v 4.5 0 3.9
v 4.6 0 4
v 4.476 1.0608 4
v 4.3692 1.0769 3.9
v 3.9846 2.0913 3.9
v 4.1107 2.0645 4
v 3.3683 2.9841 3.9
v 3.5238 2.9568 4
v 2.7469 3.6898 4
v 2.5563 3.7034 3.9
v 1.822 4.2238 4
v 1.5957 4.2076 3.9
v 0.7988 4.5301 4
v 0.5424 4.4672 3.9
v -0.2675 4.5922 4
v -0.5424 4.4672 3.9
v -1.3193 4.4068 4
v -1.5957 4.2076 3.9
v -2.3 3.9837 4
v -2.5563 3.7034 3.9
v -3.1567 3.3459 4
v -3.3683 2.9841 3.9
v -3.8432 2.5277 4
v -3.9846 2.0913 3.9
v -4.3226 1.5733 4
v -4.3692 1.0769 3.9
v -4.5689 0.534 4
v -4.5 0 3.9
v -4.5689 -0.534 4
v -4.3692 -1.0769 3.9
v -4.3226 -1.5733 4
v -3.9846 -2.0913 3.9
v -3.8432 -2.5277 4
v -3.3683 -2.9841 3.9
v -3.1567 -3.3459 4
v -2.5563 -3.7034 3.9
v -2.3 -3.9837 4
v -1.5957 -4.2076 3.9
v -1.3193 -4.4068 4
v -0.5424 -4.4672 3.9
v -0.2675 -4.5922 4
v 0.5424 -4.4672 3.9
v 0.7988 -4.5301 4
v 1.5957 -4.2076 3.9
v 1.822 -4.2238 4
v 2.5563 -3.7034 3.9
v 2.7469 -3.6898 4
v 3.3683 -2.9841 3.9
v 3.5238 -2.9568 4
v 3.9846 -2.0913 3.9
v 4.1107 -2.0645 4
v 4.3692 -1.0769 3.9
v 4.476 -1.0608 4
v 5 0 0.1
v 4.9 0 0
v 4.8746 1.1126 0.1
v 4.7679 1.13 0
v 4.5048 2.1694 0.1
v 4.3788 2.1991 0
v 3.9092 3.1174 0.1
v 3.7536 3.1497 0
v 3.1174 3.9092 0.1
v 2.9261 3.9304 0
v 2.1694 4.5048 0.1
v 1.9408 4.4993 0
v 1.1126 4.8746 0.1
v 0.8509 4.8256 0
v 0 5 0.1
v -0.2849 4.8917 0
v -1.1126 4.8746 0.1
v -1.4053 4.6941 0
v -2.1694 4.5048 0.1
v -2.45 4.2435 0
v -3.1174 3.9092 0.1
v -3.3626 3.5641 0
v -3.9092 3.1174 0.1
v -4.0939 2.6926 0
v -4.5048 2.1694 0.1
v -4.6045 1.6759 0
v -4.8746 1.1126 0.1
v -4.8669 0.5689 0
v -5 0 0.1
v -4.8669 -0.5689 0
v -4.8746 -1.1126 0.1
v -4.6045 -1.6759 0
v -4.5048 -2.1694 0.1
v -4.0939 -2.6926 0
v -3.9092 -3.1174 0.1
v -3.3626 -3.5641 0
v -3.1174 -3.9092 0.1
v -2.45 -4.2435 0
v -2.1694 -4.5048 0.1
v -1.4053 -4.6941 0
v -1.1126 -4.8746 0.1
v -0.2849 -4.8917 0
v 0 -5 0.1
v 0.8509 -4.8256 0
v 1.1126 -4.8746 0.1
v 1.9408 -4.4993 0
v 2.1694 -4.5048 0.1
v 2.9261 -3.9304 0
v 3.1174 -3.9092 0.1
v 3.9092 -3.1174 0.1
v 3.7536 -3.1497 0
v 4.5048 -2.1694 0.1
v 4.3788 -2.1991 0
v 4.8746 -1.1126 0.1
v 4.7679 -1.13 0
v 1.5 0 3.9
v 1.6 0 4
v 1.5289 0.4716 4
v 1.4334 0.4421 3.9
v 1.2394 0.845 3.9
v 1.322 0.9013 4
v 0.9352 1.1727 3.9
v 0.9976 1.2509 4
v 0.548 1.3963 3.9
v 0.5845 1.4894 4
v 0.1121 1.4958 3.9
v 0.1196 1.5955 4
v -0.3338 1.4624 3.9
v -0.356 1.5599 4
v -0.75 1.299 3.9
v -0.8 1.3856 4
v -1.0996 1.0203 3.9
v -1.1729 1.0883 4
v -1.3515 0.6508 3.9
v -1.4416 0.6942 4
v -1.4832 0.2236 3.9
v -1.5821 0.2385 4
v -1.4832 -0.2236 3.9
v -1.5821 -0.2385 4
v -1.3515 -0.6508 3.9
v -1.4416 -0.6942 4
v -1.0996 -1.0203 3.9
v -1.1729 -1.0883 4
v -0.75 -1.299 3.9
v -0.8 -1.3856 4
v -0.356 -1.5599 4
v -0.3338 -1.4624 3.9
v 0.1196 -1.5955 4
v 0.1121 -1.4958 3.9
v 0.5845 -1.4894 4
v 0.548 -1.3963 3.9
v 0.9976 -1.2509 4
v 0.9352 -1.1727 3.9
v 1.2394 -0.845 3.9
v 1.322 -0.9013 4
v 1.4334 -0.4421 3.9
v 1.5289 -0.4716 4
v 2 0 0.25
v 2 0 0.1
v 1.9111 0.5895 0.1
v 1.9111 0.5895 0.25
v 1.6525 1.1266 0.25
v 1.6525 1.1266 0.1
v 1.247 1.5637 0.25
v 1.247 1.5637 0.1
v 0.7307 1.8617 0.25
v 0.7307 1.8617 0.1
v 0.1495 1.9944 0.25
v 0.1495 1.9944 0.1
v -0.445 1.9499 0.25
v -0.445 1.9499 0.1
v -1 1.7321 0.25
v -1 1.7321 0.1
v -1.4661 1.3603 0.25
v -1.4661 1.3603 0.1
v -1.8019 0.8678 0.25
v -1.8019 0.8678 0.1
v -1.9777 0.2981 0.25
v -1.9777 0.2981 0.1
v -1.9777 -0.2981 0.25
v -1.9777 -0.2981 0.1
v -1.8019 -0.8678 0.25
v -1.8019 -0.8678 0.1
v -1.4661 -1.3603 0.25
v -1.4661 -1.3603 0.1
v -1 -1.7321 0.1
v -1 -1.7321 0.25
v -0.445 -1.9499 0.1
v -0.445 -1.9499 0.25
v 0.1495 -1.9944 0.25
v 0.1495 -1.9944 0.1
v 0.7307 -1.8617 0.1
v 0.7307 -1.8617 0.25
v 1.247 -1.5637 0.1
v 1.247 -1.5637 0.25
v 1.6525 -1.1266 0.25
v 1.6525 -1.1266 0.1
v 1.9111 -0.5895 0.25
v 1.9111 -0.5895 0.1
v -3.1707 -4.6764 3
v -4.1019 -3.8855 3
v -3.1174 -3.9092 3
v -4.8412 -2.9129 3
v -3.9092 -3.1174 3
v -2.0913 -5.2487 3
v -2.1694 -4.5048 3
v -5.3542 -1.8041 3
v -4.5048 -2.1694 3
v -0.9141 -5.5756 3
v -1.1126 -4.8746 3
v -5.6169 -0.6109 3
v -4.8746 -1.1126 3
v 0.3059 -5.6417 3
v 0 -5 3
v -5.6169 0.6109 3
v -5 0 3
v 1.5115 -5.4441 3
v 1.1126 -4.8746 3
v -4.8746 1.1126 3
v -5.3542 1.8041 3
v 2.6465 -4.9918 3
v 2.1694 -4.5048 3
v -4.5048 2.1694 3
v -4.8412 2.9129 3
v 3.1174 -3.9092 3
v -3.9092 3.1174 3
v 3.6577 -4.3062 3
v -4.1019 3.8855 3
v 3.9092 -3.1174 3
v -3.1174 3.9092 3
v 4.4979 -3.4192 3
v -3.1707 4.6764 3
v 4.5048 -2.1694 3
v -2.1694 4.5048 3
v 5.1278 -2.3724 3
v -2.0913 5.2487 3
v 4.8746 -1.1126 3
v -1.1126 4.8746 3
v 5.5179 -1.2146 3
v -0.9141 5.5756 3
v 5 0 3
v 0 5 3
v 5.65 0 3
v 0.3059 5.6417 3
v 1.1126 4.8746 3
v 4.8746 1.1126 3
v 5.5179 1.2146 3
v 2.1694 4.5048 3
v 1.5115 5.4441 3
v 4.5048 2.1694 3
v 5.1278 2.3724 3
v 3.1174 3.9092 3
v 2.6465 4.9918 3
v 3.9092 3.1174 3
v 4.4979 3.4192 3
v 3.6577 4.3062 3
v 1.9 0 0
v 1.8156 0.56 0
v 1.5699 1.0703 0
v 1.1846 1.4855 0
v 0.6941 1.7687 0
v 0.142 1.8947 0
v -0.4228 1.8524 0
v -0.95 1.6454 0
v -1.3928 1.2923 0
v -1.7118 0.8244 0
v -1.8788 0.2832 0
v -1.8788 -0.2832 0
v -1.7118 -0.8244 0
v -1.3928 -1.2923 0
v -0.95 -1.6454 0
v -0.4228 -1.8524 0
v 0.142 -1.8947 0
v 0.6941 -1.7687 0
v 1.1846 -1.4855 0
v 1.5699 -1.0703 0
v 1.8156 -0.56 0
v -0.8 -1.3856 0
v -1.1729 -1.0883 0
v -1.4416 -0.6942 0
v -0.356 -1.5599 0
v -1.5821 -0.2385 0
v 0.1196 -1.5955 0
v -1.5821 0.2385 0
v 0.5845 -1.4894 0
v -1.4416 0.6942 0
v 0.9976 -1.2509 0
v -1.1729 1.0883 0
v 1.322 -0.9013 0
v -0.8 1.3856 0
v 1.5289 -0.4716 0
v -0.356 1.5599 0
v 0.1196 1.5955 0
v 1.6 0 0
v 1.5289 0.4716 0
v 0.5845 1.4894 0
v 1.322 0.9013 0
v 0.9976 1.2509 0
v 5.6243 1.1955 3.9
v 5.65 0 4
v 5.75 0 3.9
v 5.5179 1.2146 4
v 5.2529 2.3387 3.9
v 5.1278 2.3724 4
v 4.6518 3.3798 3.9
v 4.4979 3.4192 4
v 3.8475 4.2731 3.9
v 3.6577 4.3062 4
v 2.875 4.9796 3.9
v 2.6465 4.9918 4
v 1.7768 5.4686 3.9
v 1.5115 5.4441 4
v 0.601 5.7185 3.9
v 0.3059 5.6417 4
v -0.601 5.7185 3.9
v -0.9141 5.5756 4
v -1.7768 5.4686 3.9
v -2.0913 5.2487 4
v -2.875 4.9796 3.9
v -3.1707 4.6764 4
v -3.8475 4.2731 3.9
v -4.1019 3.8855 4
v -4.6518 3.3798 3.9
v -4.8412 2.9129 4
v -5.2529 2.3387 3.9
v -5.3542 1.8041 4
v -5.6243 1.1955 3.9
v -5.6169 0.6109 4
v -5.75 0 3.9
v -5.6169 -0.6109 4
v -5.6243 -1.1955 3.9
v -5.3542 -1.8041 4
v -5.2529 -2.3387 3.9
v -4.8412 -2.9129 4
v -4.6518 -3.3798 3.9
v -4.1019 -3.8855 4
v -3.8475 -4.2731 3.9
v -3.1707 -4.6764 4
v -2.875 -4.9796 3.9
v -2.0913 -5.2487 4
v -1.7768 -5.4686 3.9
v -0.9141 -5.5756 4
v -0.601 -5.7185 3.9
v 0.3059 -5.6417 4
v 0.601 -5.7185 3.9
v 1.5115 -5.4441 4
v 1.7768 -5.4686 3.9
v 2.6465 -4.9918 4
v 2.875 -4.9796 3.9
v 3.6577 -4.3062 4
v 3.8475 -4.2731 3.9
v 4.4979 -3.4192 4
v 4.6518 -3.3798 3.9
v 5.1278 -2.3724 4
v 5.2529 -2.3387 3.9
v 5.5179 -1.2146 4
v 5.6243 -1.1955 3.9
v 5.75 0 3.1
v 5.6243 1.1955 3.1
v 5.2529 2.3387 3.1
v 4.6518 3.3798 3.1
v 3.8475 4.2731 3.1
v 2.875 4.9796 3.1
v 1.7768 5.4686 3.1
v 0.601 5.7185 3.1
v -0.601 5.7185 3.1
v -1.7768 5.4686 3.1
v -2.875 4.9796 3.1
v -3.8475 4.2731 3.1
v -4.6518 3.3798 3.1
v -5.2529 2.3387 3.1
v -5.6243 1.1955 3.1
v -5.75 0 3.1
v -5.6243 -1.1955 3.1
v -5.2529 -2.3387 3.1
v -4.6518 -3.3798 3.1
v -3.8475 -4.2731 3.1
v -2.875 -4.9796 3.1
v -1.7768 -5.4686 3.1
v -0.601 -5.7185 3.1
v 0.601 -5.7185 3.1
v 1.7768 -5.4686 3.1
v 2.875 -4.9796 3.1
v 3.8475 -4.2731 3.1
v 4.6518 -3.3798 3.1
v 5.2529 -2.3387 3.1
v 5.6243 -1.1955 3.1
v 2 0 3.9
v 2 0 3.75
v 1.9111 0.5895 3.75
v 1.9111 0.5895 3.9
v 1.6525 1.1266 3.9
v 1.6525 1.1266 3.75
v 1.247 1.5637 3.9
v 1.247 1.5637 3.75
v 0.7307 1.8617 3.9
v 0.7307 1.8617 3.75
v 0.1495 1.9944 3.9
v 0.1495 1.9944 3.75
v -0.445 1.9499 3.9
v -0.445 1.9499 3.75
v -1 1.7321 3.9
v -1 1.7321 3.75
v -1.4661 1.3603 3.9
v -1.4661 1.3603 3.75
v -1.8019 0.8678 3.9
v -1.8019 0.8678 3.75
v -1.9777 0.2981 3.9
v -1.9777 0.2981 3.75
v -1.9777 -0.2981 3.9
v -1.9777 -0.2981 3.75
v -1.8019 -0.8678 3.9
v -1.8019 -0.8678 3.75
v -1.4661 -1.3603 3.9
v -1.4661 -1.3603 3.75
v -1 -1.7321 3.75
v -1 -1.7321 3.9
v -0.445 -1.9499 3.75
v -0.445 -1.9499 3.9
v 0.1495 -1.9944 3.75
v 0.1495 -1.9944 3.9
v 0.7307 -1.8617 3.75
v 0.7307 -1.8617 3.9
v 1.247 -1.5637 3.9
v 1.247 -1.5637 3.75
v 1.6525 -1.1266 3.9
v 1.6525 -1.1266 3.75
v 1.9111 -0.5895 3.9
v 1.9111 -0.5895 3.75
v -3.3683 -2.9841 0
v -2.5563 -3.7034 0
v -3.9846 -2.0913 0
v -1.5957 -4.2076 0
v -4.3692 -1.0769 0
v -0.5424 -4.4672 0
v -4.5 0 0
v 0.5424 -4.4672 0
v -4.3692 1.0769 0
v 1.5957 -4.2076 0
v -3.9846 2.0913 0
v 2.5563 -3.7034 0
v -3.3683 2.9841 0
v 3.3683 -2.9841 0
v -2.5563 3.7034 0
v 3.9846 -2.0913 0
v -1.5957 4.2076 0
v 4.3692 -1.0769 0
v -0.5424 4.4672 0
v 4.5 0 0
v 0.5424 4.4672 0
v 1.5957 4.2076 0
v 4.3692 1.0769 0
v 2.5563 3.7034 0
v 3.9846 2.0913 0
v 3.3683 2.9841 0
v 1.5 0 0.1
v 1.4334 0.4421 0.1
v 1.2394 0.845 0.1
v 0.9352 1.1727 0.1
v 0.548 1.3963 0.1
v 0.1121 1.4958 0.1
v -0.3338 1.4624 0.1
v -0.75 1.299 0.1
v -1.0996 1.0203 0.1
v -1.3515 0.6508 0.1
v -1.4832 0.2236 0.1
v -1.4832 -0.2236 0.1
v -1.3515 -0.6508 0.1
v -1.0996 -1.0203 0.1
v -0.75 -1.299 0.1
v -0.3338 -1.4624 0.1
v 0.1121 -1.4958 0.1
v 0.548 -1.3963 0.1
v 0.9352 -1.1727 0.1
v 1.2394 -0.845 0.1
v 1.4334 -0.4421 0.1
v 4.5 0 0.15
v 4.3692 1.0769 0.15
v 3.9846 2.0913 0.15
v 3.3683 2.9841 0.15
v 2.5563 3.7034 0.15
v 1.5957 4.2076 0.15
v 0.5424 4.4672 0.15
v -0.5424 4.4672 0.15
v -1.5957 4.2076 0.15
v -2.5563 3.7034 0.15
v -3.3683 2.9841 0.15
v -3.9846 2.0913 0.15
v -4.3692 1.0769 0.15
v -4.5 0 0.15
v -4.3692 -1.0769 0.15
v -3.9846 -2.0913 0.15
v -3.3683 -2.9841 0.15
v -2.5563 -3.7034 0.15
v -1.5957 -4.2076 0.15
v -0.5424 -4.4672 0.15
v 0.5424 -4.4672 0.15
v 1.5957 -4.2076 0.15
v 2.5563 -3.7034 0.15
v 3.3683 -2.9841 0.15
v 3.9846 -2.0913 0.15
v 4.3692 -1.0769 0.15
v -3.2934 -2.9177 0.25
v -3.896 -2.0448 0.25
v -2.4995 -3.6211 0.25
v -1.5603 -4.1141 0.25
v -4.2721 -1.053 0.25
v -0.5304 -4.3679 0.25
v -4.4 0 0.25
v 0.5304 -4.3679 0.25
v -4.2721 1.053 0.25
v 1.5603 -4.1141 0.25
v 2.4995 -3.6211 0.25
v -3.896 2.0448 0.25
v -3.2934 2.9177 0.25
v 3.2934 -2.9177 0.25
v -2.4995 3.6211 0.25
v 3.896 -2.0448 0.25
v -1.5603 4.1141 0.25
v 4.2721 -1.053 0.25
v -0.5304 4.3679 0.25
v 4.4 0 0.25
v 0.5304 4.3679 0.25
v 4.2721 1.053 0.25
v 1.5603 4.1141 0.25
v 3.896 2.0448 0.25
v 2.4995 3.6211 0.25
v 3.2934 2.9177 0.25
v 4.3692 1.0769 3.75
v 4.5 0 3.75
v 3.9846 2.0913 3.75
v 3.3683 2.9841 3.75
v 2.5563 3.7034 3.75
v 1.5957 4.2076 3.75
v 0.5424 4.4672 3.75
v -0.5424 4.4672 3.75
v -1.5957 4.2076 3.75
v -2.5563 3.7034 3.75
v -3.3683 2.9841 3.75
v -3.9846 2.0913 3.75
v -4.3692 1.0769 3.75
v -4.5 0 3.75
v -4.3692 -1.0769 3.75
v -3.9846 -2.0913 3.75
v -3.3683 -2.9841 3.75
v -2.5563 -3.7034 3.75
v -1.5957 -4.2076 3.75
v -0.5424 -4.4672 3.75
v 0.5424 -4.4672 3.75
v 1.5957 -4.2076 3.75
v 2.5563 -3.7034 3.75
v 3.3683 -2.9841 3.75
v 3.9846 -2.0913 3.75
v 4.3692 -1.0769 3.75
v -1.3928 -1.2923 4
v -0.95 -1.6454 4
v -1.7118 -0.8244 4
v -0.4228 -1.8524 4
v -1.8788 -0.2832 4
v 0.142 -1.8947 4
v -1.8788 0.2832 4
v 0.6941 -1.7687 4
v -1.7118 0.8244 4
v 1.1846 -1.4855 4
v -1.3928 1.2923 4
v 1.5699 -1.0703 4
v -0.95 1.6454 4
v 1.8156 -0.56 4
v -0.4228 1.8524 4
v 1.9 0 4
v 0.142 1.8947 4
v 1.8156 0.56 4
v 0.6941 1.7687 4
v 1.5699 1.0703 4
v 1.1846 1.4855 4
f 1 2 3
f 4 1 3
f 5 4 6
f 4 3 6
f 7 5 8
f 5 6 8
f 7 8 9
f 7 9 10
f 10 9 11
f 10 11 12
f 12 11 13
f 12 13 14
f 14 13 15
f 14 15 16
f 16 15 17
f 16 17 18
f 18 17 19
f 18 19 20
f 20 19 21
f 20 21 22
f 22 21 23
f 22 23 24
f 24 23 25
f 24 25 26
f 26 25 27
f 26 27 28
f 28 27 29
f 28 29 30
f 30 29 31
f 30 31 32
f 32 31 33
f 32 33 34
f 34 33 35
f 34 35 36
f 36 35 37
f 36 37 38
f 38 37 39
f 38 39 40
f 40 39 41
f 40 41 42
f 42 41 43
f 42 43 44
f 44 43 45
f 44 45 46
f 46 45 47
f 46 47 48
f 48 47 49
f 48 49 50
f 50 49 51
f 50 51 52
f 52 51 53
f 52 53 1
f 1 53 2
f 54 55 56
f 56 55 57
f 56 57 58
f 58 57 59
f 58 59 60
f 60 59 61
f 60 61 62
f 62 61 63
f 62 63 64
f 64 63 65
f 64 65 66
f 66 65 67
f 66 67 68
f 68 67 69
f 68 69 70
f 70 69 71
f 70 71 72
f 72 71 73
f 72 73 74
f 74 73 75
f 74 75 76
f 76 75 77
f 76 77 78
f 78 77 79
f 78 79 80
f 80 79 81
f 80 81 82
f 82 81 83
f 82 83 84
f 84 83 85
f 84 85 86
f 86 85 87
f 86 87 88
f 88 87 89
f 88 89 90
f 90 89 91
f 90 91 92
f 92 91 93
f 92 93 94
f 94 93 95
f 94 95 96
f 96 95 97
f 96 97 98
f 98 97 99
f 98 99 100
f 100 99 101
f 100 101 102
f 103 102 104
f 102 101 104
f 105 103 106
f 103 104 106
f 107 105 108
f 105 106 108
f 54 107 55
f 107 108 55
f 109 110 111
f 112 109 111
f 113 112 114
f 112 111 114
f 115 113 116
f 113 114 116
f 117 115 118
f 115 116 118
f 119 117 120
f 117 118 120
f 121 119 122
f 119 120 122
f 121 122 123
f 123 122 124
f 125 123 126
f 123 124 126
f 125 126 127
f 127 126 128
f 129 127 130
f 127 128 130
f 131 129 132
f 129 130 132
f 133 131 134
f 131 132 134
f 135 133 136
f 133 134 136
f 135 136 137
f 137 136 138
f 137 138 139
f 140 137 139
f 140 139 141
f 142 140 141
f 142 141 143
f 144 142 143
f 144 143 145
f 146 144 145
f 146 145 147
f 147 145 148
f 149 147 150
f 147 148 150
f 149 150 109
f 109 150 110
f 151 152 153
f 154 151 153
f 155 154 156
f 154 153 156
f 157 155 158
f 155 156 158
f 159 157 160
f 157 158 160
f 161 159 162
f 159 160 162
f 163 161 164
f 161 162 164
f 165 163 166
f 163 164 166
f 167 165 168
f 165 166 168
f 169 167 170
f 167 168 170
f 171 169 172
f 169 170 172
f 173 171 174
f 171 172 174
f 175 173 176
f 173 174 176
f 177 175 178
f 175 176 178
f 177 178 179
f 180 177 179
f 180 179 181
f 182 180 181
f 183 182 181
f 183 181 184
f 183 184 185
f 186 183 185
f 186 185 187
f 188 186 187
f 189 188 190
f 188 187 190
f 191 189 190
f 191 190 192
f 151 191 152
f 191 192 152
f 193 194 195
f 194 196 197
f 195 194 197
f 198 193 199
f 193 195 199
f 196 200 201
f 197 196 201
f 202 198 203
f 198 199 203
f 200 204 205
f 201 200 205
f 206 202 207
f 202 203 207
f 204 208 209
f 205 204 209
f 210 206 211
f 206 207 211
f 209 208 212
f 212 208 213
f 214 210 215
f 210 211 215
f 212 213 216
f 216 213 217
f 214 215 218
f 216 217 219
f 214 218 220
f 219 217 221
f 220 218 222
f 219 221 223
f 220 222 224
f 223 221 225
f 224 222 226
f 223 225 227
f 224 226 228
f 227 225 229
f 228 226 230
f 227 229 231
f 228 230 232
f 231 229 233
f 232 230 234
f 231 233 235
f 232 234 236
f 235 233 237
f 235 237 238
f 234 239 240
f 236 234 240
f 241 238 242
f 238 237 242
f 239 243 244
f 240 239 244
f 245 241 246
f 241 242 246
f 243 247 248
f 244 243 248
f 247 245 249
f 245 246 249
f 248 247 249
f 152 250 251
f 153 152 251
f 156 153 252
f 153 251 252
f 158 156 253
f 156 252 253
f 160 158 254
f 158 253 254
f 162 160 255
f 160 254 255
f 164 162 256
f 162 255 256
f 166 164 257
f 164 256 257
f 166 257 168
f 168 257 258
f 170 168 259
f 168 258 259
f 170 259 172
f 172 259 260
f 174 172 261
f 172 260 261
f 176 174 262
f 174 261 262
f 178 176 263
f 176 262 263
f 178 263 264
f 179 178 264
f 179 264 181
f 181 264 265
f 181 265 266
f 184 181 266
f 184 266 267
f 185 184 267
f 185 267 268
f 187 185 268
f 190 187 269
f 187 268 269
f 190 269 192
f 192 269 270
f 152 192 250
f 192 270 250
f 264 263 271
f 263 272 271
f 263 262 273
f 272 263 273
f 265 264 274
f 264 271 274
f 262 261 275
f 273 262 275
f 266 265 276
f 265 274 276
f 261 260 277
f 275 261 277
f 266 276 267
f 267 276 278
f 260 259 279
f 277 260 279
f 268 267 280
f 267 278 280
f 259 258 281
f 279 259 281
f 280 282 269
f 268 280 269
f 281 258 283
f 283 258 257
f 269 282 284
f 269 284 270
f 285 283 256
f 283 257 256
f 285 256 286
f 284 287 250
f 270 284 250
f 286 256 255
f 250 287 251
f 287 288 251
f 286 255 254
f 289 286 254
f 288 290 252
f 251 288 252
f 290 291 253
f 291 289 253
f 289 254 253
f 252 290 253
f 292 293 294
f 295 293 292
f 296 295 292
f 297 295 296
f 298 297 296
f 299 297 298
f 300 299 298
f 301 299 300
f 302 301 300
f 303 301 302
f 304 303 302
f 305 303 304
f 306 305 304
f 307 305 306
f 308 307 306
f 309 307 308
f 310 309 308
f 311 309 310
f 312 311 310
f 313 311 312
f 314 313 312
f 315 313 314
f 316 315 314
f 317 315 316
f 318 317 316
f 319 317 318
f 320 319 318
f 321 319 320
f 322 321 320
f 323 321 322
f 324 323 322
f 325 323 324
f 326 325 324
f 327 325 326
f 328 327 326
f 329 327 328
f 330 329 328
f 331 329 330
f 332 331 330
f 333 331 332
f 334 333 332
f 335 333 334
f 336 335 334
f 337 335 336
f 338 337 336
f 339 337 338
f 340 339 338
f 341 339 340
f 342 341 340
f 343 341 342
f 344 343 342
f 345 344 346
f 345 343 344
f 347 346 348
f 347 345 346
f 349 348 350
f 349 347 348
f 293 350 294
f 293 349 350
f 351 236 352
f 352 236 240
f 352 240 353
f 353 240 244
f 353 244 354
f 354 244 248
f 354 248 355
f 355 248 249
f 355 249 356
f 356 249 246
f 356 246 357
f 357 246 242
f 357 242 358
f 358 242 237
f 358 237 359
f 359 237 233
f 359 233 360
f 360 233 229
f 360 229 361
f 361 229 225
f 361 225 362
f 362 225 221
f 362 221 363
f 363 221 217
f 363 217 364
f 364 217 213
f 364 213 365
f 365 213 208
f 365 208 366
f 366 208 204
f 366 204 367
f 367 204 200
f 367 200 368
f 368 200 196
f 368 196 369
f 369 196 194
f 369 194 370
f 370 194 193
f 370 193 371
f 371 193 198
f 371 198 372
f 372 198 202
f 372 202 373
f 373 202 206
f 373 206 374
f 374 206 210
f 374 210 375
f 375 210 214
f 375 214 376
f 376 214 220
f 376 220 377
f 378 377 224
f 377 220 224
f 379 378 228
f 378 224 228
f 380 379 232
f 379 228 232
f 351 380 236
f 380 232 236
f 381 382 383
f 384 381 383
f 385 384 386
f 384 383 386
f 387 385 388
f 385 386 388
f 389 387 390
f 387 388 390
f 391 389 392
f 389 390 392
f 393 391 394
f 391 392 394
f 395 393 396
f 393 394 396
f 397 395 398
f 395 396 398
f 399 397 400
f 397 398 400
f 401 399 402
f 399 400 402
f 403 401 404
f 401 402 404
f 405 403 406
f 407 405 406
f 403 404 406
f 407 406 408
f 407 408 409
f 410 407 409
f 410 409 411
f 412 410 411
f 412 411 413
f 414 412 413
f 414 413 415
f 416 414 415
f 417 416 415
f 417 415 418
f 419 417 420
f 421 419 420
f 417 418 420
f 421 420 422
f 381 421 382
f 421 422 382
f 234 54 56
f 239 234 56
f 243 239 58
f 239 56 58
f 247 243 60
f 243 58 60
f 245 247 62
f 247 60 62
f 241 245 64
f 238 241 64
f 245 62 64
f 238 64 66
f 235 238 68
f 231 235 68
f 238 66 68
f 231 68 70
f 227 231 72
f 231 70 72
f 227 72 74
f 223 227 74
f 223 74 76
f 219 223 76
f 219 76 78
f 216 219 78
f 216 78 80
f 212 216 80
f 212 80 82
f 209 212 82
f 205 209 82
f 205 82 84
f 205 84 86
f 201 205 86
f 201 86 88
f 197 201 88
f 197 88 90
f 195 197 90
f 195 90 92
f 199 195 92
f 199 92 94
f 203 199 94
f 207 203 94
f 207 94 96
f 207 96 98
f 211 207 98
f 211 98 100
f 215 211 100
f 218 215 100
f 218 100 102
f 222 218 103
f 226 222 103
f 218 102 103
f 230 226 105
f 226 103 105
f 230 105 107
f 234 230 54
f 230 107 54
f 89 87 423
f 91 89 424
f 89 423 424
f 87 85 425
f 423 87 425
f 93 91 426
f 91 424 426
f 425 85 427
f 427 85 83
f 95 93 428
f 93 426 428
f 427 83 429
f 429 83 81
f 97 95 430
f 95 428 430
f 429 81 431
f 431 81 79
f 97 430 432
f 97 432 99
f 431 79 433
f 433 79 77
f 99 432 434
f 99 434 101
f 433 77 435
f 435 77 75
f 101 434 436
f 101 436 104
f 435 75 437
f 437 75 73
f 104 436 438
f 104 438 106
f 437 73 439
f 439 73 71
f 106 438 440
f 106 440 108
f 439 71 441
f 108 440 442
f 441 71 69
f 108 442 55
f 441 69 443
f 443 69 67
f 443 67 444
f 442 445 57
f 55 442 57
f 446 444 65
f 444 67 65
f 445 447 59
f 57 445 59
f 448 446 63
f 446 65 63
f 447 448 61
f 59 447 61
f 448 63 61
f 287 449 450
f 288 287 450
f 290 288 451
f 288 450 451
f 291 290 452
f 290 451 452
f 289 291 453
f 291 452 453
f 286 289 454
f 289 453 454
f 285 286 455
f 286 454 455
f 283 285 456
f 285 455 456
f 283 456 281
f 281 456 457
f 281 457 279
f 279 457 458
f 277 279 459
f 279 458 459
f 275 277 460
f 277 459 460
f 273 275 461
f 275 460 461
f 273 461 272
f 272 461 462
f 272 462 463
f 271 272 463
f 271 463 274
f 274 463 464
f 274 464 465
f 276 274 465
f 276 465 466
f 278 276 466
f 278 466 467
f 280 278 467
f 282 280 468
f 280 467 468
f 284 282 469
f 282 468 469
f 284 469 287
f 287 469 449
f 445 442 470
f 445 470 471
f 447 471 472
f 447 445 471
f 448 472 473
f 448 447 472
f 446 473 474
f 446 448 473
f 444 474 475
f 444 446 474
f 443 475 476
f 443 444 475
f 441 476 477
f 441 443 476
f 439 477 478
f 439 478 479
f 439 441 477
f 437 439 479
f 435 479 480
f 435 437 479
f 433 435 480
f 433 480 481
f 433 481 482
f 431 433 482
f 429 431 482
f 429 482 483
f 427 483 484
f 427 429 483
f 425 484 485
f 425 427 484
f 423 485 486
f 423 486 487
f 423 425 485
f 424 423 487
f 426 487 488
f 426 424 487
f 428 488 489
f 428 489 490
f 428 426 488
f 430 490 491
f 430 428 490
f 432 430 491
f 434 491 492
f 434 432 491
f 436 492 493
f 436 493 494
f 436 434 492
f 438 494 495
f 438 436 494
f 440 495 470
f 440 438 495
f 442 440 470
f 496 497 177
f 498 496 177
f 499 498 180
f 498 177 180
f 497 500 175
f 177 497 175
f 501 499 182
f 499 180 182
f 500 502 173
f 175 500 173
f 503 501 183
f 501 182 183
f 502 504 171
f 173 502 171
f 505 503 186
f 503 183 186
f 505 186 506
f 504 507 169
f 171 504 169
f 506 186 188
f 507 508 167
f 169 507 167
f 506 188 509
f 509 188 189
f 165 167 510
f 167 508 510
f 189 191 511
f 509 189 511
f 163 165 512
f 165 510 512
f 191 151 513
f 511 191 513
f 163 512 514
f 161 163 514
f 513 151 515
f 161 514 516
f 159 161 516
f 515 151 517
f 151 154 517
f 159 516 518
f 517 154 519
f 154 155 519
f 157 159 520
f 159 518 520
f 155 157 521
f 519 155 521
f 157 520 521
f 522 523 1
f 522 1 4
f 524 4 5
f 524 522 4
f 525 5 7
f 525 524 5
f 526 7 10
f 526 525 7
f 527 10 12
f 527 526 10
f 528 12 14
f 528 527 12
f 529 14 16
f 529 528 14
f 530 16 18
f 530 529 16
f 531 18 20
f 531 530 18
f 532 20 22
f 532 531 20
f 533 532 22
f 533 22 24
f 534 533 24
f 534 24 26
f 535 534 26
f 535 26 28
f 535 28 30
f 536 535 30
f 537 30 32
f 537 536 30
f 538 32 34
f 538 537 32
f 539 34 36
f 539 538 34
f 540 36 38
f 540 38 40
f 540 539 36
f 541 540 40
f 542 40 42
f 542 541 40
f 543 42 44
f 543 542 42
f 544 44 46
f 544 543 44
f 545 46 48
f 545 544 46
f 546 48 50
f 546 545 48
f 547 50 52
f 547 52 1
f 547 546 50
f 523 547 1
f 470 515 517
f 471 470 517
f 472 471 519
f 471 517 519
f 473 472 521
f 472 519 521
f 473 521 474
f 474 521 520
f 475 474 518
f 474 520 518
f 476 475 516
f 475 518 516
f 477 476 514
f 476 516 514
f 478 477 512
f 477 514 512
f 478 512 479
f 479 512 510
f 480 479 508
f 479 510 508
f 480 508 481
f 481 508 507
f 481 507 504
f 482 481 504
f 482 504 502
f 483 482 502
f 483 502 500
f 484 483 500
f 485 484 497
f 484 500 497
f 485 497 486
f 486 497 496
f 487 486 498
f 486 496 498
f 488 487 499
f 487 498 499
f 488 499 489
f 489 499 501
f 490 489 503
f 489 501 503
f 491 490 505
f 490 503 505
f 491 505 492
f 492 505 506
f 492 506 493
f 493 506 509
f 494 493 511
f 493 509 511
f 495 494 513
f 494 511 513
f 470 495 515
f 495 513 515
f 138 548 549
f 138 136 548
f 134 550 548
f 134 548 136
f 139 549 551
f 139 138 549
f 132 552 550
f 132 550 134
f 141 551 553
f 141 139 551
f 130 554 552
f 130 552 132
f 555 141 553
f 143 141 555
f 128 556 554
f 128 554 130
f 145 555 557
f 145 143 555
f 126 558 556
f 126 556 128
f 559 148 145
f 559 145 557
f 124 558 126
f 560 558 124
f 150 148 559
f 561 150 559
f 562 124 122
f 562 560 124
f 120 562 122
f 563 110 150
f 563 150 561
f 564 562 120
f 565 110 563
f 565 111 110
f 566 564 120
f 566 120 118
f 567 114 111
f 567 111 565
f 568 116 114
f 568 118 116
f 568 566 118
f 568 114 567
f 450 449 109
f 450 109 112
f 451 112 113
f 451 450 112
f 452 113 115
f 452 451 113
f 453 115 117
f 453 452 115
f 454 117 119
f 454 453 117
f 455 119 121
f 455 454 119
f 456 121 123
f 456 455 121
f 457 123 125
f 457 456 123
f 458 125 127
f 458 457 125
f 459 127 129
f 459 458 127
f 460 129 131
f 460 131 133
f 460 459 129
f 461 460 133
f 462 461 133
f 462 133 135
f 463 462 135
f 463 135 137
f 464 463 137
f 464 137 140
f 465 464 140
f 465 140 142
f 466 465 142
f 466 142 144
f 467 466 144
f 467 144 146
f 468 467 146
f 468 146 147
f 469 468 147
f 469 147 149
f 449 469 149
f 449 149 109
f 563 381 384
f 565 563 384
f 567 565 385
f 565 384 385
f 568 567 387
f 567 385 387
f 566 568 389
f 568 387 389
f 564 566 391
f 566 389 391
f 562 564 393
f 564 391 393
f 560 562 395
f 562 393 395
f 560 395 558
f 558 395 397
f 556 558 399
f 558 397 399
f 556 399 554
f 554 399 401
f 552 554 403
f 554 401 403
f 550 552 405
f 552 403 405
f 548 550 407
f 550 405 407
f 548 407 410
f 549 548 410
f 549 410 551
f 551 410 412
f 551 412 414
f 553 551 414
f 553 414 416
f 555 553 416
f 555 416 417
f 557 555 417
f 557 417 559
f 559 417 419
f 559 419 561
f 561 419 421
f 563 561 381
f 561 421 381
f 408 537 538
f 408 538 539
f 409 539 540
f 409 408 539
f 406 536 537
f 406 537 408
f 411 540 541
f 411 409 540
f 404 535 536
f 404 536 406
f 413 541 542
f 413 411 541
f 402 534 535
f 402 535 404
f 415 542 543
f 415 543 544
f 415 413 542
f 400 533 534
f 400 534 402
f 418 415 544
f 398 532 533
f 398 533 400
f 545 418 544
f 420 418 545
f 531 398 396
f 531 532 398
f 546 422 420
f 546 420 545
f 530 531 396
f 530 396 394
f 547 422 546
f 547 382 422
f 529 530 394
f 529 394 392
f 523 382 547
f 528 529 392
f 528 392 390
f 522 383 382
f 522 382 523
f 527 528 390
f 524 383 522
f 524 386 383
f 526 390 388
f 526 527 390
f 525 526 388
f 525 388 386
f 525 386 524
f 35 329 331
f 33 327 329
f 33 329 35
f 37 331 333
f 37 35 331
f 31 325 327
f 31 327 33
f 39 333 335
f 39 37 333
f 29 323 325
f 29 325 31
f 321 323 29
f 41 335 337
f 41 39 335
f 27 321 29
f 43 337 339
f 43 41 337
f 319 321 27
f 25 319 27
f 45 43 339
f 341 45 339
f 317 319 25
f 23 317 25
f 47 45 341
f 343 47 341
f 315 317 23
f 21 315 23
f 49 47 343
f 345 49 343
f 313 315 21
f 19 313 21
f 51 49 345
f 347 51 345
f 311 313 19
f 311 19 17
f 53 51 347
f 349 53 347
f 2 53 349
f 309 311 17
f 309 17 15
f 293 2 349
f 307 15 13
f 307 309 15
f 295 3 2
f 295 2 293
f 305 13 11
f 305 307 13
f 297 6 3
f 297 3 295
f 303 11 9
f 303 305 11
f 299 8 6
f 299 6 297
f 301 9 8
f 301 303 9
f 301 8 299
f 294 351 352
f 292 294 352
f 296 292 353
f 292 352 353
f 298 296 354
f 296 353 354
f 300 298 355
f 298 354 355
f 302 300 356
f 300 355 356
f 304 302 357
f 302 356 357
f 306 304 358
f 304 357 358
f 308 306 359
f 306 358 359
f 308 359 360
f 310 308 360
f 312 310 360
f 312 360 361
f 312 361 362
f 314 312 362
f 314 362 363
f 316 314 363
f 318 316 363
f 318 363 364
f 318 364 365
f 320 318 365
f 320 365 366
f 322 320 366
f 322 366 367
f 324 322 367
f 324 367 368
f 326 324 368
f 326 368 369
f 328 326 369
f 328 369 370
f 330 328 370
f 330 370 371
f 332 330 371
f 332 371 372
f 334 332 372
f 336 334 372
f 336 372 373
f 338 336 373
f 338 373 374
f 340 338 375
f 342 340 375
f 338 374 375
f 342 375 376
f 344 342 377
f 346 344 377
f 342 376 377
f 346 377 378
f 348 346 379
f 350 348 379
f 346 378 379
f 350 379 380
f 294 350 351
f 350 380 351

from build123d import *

# Parameters (mm, degrees)
F0_R     = 2
F0_R_2   = 1.5
F1_DEPTH = 0.25
F0_R_3   = 5
F0_R_4   = 4.5
F2_R     = 5
F2_R_2   = 4.5
F2_R_3   = 2
F2_R_4   = 1.5
F3_DEPTH = 2.75
F4_R     = 5.75
F4_R_2   = 5
F4_R_3   = 1.5
F5_DEPTH = 0.75
F6_R     = 5.75
F6_R_2   = 4.5
F6_R_3   = 2
F6_R_4   = 1.5
F7_DEPTH = 0.25
F8_SIZE  = 0.1


with BuildPart() as f1:
    # F0 (on Top) → F1 (new body)
    with BuildSketch(Plane.XY):
        Circle(F0_R)
        Circle(F0_R_2, mode=Mode.SUBTRACT)
    extrude(amount=F1_DEPTH)



with BuildPart() as f1b:
    # F0 (on Top) → F1, piece 2 (new body)
    with BuildSketch(Plane.XY):
        Circle(F0_R_3)
        Circle(F0_R_4, mode=Mode.SUBTRACT)
    extrude(amount=F1_DEPTH)


with BuildPart() as f1_1:
    add(f1.part)

    add(f1b.part)  # F3 merges F1b
    # F2 (on face) → F3 (join)
    with BuildSketch(Plane.XY.offset(0.25)):
        Circle(F2_R)
        Circle(F2_R_2, mode=Mode.SUBTRACT)
        Circle(F2_R_2)
        Circle(F2_R_3, mode=Mode.SUBTRACT)
        Circle(F2_R_3)
        Circle(F2_R_4, mode=Mode.SUBTRACT)
    extrude(amount=F3_DEPTH)

    # F4 (on face) → F5 (join)
    with BuildSketch(Plane.XY.offset(3)):
        Circle(F4_R)
        Circle(F4_R_2, mode=Mode.SUBTRACT)
        Circle(F4_R_2)
        Circle(F4_R_3, mode=Mode.SUBTRACT)
    extrude(amount=F5_DEPTH)

    # F6 (on face) → F7 (join)
    with BuildSketch(Plane.XY.offset(3.75)):
        Circle(F6_R)
        Circle(F6_R_2, mode=Mode.SUBTRACT)
        Circle(F6_R_3)
        Circle(F6_R_4, mode=Mode.SUBTRACT)
    extrude(amount=F7_DEPTH)

    # F8
    f8_edges = [f1_1.edges().sort_by_distance(p)[0] for p in [
        (-5, 0, 0),
        (-5.75, 0, 3),
        (-5.75, 0, 4),
        (-4.5, 0, 4),
        (-4.5, 0, 0.25),
        (-2, 0, 0),
        (-1.5, 0, 0),
        (-2, 0, 4),
        (-1.5, 0, 4),
    ]]
    chamfer(f8_edges, length=F8_SIZE)


solid = f1_1.part
